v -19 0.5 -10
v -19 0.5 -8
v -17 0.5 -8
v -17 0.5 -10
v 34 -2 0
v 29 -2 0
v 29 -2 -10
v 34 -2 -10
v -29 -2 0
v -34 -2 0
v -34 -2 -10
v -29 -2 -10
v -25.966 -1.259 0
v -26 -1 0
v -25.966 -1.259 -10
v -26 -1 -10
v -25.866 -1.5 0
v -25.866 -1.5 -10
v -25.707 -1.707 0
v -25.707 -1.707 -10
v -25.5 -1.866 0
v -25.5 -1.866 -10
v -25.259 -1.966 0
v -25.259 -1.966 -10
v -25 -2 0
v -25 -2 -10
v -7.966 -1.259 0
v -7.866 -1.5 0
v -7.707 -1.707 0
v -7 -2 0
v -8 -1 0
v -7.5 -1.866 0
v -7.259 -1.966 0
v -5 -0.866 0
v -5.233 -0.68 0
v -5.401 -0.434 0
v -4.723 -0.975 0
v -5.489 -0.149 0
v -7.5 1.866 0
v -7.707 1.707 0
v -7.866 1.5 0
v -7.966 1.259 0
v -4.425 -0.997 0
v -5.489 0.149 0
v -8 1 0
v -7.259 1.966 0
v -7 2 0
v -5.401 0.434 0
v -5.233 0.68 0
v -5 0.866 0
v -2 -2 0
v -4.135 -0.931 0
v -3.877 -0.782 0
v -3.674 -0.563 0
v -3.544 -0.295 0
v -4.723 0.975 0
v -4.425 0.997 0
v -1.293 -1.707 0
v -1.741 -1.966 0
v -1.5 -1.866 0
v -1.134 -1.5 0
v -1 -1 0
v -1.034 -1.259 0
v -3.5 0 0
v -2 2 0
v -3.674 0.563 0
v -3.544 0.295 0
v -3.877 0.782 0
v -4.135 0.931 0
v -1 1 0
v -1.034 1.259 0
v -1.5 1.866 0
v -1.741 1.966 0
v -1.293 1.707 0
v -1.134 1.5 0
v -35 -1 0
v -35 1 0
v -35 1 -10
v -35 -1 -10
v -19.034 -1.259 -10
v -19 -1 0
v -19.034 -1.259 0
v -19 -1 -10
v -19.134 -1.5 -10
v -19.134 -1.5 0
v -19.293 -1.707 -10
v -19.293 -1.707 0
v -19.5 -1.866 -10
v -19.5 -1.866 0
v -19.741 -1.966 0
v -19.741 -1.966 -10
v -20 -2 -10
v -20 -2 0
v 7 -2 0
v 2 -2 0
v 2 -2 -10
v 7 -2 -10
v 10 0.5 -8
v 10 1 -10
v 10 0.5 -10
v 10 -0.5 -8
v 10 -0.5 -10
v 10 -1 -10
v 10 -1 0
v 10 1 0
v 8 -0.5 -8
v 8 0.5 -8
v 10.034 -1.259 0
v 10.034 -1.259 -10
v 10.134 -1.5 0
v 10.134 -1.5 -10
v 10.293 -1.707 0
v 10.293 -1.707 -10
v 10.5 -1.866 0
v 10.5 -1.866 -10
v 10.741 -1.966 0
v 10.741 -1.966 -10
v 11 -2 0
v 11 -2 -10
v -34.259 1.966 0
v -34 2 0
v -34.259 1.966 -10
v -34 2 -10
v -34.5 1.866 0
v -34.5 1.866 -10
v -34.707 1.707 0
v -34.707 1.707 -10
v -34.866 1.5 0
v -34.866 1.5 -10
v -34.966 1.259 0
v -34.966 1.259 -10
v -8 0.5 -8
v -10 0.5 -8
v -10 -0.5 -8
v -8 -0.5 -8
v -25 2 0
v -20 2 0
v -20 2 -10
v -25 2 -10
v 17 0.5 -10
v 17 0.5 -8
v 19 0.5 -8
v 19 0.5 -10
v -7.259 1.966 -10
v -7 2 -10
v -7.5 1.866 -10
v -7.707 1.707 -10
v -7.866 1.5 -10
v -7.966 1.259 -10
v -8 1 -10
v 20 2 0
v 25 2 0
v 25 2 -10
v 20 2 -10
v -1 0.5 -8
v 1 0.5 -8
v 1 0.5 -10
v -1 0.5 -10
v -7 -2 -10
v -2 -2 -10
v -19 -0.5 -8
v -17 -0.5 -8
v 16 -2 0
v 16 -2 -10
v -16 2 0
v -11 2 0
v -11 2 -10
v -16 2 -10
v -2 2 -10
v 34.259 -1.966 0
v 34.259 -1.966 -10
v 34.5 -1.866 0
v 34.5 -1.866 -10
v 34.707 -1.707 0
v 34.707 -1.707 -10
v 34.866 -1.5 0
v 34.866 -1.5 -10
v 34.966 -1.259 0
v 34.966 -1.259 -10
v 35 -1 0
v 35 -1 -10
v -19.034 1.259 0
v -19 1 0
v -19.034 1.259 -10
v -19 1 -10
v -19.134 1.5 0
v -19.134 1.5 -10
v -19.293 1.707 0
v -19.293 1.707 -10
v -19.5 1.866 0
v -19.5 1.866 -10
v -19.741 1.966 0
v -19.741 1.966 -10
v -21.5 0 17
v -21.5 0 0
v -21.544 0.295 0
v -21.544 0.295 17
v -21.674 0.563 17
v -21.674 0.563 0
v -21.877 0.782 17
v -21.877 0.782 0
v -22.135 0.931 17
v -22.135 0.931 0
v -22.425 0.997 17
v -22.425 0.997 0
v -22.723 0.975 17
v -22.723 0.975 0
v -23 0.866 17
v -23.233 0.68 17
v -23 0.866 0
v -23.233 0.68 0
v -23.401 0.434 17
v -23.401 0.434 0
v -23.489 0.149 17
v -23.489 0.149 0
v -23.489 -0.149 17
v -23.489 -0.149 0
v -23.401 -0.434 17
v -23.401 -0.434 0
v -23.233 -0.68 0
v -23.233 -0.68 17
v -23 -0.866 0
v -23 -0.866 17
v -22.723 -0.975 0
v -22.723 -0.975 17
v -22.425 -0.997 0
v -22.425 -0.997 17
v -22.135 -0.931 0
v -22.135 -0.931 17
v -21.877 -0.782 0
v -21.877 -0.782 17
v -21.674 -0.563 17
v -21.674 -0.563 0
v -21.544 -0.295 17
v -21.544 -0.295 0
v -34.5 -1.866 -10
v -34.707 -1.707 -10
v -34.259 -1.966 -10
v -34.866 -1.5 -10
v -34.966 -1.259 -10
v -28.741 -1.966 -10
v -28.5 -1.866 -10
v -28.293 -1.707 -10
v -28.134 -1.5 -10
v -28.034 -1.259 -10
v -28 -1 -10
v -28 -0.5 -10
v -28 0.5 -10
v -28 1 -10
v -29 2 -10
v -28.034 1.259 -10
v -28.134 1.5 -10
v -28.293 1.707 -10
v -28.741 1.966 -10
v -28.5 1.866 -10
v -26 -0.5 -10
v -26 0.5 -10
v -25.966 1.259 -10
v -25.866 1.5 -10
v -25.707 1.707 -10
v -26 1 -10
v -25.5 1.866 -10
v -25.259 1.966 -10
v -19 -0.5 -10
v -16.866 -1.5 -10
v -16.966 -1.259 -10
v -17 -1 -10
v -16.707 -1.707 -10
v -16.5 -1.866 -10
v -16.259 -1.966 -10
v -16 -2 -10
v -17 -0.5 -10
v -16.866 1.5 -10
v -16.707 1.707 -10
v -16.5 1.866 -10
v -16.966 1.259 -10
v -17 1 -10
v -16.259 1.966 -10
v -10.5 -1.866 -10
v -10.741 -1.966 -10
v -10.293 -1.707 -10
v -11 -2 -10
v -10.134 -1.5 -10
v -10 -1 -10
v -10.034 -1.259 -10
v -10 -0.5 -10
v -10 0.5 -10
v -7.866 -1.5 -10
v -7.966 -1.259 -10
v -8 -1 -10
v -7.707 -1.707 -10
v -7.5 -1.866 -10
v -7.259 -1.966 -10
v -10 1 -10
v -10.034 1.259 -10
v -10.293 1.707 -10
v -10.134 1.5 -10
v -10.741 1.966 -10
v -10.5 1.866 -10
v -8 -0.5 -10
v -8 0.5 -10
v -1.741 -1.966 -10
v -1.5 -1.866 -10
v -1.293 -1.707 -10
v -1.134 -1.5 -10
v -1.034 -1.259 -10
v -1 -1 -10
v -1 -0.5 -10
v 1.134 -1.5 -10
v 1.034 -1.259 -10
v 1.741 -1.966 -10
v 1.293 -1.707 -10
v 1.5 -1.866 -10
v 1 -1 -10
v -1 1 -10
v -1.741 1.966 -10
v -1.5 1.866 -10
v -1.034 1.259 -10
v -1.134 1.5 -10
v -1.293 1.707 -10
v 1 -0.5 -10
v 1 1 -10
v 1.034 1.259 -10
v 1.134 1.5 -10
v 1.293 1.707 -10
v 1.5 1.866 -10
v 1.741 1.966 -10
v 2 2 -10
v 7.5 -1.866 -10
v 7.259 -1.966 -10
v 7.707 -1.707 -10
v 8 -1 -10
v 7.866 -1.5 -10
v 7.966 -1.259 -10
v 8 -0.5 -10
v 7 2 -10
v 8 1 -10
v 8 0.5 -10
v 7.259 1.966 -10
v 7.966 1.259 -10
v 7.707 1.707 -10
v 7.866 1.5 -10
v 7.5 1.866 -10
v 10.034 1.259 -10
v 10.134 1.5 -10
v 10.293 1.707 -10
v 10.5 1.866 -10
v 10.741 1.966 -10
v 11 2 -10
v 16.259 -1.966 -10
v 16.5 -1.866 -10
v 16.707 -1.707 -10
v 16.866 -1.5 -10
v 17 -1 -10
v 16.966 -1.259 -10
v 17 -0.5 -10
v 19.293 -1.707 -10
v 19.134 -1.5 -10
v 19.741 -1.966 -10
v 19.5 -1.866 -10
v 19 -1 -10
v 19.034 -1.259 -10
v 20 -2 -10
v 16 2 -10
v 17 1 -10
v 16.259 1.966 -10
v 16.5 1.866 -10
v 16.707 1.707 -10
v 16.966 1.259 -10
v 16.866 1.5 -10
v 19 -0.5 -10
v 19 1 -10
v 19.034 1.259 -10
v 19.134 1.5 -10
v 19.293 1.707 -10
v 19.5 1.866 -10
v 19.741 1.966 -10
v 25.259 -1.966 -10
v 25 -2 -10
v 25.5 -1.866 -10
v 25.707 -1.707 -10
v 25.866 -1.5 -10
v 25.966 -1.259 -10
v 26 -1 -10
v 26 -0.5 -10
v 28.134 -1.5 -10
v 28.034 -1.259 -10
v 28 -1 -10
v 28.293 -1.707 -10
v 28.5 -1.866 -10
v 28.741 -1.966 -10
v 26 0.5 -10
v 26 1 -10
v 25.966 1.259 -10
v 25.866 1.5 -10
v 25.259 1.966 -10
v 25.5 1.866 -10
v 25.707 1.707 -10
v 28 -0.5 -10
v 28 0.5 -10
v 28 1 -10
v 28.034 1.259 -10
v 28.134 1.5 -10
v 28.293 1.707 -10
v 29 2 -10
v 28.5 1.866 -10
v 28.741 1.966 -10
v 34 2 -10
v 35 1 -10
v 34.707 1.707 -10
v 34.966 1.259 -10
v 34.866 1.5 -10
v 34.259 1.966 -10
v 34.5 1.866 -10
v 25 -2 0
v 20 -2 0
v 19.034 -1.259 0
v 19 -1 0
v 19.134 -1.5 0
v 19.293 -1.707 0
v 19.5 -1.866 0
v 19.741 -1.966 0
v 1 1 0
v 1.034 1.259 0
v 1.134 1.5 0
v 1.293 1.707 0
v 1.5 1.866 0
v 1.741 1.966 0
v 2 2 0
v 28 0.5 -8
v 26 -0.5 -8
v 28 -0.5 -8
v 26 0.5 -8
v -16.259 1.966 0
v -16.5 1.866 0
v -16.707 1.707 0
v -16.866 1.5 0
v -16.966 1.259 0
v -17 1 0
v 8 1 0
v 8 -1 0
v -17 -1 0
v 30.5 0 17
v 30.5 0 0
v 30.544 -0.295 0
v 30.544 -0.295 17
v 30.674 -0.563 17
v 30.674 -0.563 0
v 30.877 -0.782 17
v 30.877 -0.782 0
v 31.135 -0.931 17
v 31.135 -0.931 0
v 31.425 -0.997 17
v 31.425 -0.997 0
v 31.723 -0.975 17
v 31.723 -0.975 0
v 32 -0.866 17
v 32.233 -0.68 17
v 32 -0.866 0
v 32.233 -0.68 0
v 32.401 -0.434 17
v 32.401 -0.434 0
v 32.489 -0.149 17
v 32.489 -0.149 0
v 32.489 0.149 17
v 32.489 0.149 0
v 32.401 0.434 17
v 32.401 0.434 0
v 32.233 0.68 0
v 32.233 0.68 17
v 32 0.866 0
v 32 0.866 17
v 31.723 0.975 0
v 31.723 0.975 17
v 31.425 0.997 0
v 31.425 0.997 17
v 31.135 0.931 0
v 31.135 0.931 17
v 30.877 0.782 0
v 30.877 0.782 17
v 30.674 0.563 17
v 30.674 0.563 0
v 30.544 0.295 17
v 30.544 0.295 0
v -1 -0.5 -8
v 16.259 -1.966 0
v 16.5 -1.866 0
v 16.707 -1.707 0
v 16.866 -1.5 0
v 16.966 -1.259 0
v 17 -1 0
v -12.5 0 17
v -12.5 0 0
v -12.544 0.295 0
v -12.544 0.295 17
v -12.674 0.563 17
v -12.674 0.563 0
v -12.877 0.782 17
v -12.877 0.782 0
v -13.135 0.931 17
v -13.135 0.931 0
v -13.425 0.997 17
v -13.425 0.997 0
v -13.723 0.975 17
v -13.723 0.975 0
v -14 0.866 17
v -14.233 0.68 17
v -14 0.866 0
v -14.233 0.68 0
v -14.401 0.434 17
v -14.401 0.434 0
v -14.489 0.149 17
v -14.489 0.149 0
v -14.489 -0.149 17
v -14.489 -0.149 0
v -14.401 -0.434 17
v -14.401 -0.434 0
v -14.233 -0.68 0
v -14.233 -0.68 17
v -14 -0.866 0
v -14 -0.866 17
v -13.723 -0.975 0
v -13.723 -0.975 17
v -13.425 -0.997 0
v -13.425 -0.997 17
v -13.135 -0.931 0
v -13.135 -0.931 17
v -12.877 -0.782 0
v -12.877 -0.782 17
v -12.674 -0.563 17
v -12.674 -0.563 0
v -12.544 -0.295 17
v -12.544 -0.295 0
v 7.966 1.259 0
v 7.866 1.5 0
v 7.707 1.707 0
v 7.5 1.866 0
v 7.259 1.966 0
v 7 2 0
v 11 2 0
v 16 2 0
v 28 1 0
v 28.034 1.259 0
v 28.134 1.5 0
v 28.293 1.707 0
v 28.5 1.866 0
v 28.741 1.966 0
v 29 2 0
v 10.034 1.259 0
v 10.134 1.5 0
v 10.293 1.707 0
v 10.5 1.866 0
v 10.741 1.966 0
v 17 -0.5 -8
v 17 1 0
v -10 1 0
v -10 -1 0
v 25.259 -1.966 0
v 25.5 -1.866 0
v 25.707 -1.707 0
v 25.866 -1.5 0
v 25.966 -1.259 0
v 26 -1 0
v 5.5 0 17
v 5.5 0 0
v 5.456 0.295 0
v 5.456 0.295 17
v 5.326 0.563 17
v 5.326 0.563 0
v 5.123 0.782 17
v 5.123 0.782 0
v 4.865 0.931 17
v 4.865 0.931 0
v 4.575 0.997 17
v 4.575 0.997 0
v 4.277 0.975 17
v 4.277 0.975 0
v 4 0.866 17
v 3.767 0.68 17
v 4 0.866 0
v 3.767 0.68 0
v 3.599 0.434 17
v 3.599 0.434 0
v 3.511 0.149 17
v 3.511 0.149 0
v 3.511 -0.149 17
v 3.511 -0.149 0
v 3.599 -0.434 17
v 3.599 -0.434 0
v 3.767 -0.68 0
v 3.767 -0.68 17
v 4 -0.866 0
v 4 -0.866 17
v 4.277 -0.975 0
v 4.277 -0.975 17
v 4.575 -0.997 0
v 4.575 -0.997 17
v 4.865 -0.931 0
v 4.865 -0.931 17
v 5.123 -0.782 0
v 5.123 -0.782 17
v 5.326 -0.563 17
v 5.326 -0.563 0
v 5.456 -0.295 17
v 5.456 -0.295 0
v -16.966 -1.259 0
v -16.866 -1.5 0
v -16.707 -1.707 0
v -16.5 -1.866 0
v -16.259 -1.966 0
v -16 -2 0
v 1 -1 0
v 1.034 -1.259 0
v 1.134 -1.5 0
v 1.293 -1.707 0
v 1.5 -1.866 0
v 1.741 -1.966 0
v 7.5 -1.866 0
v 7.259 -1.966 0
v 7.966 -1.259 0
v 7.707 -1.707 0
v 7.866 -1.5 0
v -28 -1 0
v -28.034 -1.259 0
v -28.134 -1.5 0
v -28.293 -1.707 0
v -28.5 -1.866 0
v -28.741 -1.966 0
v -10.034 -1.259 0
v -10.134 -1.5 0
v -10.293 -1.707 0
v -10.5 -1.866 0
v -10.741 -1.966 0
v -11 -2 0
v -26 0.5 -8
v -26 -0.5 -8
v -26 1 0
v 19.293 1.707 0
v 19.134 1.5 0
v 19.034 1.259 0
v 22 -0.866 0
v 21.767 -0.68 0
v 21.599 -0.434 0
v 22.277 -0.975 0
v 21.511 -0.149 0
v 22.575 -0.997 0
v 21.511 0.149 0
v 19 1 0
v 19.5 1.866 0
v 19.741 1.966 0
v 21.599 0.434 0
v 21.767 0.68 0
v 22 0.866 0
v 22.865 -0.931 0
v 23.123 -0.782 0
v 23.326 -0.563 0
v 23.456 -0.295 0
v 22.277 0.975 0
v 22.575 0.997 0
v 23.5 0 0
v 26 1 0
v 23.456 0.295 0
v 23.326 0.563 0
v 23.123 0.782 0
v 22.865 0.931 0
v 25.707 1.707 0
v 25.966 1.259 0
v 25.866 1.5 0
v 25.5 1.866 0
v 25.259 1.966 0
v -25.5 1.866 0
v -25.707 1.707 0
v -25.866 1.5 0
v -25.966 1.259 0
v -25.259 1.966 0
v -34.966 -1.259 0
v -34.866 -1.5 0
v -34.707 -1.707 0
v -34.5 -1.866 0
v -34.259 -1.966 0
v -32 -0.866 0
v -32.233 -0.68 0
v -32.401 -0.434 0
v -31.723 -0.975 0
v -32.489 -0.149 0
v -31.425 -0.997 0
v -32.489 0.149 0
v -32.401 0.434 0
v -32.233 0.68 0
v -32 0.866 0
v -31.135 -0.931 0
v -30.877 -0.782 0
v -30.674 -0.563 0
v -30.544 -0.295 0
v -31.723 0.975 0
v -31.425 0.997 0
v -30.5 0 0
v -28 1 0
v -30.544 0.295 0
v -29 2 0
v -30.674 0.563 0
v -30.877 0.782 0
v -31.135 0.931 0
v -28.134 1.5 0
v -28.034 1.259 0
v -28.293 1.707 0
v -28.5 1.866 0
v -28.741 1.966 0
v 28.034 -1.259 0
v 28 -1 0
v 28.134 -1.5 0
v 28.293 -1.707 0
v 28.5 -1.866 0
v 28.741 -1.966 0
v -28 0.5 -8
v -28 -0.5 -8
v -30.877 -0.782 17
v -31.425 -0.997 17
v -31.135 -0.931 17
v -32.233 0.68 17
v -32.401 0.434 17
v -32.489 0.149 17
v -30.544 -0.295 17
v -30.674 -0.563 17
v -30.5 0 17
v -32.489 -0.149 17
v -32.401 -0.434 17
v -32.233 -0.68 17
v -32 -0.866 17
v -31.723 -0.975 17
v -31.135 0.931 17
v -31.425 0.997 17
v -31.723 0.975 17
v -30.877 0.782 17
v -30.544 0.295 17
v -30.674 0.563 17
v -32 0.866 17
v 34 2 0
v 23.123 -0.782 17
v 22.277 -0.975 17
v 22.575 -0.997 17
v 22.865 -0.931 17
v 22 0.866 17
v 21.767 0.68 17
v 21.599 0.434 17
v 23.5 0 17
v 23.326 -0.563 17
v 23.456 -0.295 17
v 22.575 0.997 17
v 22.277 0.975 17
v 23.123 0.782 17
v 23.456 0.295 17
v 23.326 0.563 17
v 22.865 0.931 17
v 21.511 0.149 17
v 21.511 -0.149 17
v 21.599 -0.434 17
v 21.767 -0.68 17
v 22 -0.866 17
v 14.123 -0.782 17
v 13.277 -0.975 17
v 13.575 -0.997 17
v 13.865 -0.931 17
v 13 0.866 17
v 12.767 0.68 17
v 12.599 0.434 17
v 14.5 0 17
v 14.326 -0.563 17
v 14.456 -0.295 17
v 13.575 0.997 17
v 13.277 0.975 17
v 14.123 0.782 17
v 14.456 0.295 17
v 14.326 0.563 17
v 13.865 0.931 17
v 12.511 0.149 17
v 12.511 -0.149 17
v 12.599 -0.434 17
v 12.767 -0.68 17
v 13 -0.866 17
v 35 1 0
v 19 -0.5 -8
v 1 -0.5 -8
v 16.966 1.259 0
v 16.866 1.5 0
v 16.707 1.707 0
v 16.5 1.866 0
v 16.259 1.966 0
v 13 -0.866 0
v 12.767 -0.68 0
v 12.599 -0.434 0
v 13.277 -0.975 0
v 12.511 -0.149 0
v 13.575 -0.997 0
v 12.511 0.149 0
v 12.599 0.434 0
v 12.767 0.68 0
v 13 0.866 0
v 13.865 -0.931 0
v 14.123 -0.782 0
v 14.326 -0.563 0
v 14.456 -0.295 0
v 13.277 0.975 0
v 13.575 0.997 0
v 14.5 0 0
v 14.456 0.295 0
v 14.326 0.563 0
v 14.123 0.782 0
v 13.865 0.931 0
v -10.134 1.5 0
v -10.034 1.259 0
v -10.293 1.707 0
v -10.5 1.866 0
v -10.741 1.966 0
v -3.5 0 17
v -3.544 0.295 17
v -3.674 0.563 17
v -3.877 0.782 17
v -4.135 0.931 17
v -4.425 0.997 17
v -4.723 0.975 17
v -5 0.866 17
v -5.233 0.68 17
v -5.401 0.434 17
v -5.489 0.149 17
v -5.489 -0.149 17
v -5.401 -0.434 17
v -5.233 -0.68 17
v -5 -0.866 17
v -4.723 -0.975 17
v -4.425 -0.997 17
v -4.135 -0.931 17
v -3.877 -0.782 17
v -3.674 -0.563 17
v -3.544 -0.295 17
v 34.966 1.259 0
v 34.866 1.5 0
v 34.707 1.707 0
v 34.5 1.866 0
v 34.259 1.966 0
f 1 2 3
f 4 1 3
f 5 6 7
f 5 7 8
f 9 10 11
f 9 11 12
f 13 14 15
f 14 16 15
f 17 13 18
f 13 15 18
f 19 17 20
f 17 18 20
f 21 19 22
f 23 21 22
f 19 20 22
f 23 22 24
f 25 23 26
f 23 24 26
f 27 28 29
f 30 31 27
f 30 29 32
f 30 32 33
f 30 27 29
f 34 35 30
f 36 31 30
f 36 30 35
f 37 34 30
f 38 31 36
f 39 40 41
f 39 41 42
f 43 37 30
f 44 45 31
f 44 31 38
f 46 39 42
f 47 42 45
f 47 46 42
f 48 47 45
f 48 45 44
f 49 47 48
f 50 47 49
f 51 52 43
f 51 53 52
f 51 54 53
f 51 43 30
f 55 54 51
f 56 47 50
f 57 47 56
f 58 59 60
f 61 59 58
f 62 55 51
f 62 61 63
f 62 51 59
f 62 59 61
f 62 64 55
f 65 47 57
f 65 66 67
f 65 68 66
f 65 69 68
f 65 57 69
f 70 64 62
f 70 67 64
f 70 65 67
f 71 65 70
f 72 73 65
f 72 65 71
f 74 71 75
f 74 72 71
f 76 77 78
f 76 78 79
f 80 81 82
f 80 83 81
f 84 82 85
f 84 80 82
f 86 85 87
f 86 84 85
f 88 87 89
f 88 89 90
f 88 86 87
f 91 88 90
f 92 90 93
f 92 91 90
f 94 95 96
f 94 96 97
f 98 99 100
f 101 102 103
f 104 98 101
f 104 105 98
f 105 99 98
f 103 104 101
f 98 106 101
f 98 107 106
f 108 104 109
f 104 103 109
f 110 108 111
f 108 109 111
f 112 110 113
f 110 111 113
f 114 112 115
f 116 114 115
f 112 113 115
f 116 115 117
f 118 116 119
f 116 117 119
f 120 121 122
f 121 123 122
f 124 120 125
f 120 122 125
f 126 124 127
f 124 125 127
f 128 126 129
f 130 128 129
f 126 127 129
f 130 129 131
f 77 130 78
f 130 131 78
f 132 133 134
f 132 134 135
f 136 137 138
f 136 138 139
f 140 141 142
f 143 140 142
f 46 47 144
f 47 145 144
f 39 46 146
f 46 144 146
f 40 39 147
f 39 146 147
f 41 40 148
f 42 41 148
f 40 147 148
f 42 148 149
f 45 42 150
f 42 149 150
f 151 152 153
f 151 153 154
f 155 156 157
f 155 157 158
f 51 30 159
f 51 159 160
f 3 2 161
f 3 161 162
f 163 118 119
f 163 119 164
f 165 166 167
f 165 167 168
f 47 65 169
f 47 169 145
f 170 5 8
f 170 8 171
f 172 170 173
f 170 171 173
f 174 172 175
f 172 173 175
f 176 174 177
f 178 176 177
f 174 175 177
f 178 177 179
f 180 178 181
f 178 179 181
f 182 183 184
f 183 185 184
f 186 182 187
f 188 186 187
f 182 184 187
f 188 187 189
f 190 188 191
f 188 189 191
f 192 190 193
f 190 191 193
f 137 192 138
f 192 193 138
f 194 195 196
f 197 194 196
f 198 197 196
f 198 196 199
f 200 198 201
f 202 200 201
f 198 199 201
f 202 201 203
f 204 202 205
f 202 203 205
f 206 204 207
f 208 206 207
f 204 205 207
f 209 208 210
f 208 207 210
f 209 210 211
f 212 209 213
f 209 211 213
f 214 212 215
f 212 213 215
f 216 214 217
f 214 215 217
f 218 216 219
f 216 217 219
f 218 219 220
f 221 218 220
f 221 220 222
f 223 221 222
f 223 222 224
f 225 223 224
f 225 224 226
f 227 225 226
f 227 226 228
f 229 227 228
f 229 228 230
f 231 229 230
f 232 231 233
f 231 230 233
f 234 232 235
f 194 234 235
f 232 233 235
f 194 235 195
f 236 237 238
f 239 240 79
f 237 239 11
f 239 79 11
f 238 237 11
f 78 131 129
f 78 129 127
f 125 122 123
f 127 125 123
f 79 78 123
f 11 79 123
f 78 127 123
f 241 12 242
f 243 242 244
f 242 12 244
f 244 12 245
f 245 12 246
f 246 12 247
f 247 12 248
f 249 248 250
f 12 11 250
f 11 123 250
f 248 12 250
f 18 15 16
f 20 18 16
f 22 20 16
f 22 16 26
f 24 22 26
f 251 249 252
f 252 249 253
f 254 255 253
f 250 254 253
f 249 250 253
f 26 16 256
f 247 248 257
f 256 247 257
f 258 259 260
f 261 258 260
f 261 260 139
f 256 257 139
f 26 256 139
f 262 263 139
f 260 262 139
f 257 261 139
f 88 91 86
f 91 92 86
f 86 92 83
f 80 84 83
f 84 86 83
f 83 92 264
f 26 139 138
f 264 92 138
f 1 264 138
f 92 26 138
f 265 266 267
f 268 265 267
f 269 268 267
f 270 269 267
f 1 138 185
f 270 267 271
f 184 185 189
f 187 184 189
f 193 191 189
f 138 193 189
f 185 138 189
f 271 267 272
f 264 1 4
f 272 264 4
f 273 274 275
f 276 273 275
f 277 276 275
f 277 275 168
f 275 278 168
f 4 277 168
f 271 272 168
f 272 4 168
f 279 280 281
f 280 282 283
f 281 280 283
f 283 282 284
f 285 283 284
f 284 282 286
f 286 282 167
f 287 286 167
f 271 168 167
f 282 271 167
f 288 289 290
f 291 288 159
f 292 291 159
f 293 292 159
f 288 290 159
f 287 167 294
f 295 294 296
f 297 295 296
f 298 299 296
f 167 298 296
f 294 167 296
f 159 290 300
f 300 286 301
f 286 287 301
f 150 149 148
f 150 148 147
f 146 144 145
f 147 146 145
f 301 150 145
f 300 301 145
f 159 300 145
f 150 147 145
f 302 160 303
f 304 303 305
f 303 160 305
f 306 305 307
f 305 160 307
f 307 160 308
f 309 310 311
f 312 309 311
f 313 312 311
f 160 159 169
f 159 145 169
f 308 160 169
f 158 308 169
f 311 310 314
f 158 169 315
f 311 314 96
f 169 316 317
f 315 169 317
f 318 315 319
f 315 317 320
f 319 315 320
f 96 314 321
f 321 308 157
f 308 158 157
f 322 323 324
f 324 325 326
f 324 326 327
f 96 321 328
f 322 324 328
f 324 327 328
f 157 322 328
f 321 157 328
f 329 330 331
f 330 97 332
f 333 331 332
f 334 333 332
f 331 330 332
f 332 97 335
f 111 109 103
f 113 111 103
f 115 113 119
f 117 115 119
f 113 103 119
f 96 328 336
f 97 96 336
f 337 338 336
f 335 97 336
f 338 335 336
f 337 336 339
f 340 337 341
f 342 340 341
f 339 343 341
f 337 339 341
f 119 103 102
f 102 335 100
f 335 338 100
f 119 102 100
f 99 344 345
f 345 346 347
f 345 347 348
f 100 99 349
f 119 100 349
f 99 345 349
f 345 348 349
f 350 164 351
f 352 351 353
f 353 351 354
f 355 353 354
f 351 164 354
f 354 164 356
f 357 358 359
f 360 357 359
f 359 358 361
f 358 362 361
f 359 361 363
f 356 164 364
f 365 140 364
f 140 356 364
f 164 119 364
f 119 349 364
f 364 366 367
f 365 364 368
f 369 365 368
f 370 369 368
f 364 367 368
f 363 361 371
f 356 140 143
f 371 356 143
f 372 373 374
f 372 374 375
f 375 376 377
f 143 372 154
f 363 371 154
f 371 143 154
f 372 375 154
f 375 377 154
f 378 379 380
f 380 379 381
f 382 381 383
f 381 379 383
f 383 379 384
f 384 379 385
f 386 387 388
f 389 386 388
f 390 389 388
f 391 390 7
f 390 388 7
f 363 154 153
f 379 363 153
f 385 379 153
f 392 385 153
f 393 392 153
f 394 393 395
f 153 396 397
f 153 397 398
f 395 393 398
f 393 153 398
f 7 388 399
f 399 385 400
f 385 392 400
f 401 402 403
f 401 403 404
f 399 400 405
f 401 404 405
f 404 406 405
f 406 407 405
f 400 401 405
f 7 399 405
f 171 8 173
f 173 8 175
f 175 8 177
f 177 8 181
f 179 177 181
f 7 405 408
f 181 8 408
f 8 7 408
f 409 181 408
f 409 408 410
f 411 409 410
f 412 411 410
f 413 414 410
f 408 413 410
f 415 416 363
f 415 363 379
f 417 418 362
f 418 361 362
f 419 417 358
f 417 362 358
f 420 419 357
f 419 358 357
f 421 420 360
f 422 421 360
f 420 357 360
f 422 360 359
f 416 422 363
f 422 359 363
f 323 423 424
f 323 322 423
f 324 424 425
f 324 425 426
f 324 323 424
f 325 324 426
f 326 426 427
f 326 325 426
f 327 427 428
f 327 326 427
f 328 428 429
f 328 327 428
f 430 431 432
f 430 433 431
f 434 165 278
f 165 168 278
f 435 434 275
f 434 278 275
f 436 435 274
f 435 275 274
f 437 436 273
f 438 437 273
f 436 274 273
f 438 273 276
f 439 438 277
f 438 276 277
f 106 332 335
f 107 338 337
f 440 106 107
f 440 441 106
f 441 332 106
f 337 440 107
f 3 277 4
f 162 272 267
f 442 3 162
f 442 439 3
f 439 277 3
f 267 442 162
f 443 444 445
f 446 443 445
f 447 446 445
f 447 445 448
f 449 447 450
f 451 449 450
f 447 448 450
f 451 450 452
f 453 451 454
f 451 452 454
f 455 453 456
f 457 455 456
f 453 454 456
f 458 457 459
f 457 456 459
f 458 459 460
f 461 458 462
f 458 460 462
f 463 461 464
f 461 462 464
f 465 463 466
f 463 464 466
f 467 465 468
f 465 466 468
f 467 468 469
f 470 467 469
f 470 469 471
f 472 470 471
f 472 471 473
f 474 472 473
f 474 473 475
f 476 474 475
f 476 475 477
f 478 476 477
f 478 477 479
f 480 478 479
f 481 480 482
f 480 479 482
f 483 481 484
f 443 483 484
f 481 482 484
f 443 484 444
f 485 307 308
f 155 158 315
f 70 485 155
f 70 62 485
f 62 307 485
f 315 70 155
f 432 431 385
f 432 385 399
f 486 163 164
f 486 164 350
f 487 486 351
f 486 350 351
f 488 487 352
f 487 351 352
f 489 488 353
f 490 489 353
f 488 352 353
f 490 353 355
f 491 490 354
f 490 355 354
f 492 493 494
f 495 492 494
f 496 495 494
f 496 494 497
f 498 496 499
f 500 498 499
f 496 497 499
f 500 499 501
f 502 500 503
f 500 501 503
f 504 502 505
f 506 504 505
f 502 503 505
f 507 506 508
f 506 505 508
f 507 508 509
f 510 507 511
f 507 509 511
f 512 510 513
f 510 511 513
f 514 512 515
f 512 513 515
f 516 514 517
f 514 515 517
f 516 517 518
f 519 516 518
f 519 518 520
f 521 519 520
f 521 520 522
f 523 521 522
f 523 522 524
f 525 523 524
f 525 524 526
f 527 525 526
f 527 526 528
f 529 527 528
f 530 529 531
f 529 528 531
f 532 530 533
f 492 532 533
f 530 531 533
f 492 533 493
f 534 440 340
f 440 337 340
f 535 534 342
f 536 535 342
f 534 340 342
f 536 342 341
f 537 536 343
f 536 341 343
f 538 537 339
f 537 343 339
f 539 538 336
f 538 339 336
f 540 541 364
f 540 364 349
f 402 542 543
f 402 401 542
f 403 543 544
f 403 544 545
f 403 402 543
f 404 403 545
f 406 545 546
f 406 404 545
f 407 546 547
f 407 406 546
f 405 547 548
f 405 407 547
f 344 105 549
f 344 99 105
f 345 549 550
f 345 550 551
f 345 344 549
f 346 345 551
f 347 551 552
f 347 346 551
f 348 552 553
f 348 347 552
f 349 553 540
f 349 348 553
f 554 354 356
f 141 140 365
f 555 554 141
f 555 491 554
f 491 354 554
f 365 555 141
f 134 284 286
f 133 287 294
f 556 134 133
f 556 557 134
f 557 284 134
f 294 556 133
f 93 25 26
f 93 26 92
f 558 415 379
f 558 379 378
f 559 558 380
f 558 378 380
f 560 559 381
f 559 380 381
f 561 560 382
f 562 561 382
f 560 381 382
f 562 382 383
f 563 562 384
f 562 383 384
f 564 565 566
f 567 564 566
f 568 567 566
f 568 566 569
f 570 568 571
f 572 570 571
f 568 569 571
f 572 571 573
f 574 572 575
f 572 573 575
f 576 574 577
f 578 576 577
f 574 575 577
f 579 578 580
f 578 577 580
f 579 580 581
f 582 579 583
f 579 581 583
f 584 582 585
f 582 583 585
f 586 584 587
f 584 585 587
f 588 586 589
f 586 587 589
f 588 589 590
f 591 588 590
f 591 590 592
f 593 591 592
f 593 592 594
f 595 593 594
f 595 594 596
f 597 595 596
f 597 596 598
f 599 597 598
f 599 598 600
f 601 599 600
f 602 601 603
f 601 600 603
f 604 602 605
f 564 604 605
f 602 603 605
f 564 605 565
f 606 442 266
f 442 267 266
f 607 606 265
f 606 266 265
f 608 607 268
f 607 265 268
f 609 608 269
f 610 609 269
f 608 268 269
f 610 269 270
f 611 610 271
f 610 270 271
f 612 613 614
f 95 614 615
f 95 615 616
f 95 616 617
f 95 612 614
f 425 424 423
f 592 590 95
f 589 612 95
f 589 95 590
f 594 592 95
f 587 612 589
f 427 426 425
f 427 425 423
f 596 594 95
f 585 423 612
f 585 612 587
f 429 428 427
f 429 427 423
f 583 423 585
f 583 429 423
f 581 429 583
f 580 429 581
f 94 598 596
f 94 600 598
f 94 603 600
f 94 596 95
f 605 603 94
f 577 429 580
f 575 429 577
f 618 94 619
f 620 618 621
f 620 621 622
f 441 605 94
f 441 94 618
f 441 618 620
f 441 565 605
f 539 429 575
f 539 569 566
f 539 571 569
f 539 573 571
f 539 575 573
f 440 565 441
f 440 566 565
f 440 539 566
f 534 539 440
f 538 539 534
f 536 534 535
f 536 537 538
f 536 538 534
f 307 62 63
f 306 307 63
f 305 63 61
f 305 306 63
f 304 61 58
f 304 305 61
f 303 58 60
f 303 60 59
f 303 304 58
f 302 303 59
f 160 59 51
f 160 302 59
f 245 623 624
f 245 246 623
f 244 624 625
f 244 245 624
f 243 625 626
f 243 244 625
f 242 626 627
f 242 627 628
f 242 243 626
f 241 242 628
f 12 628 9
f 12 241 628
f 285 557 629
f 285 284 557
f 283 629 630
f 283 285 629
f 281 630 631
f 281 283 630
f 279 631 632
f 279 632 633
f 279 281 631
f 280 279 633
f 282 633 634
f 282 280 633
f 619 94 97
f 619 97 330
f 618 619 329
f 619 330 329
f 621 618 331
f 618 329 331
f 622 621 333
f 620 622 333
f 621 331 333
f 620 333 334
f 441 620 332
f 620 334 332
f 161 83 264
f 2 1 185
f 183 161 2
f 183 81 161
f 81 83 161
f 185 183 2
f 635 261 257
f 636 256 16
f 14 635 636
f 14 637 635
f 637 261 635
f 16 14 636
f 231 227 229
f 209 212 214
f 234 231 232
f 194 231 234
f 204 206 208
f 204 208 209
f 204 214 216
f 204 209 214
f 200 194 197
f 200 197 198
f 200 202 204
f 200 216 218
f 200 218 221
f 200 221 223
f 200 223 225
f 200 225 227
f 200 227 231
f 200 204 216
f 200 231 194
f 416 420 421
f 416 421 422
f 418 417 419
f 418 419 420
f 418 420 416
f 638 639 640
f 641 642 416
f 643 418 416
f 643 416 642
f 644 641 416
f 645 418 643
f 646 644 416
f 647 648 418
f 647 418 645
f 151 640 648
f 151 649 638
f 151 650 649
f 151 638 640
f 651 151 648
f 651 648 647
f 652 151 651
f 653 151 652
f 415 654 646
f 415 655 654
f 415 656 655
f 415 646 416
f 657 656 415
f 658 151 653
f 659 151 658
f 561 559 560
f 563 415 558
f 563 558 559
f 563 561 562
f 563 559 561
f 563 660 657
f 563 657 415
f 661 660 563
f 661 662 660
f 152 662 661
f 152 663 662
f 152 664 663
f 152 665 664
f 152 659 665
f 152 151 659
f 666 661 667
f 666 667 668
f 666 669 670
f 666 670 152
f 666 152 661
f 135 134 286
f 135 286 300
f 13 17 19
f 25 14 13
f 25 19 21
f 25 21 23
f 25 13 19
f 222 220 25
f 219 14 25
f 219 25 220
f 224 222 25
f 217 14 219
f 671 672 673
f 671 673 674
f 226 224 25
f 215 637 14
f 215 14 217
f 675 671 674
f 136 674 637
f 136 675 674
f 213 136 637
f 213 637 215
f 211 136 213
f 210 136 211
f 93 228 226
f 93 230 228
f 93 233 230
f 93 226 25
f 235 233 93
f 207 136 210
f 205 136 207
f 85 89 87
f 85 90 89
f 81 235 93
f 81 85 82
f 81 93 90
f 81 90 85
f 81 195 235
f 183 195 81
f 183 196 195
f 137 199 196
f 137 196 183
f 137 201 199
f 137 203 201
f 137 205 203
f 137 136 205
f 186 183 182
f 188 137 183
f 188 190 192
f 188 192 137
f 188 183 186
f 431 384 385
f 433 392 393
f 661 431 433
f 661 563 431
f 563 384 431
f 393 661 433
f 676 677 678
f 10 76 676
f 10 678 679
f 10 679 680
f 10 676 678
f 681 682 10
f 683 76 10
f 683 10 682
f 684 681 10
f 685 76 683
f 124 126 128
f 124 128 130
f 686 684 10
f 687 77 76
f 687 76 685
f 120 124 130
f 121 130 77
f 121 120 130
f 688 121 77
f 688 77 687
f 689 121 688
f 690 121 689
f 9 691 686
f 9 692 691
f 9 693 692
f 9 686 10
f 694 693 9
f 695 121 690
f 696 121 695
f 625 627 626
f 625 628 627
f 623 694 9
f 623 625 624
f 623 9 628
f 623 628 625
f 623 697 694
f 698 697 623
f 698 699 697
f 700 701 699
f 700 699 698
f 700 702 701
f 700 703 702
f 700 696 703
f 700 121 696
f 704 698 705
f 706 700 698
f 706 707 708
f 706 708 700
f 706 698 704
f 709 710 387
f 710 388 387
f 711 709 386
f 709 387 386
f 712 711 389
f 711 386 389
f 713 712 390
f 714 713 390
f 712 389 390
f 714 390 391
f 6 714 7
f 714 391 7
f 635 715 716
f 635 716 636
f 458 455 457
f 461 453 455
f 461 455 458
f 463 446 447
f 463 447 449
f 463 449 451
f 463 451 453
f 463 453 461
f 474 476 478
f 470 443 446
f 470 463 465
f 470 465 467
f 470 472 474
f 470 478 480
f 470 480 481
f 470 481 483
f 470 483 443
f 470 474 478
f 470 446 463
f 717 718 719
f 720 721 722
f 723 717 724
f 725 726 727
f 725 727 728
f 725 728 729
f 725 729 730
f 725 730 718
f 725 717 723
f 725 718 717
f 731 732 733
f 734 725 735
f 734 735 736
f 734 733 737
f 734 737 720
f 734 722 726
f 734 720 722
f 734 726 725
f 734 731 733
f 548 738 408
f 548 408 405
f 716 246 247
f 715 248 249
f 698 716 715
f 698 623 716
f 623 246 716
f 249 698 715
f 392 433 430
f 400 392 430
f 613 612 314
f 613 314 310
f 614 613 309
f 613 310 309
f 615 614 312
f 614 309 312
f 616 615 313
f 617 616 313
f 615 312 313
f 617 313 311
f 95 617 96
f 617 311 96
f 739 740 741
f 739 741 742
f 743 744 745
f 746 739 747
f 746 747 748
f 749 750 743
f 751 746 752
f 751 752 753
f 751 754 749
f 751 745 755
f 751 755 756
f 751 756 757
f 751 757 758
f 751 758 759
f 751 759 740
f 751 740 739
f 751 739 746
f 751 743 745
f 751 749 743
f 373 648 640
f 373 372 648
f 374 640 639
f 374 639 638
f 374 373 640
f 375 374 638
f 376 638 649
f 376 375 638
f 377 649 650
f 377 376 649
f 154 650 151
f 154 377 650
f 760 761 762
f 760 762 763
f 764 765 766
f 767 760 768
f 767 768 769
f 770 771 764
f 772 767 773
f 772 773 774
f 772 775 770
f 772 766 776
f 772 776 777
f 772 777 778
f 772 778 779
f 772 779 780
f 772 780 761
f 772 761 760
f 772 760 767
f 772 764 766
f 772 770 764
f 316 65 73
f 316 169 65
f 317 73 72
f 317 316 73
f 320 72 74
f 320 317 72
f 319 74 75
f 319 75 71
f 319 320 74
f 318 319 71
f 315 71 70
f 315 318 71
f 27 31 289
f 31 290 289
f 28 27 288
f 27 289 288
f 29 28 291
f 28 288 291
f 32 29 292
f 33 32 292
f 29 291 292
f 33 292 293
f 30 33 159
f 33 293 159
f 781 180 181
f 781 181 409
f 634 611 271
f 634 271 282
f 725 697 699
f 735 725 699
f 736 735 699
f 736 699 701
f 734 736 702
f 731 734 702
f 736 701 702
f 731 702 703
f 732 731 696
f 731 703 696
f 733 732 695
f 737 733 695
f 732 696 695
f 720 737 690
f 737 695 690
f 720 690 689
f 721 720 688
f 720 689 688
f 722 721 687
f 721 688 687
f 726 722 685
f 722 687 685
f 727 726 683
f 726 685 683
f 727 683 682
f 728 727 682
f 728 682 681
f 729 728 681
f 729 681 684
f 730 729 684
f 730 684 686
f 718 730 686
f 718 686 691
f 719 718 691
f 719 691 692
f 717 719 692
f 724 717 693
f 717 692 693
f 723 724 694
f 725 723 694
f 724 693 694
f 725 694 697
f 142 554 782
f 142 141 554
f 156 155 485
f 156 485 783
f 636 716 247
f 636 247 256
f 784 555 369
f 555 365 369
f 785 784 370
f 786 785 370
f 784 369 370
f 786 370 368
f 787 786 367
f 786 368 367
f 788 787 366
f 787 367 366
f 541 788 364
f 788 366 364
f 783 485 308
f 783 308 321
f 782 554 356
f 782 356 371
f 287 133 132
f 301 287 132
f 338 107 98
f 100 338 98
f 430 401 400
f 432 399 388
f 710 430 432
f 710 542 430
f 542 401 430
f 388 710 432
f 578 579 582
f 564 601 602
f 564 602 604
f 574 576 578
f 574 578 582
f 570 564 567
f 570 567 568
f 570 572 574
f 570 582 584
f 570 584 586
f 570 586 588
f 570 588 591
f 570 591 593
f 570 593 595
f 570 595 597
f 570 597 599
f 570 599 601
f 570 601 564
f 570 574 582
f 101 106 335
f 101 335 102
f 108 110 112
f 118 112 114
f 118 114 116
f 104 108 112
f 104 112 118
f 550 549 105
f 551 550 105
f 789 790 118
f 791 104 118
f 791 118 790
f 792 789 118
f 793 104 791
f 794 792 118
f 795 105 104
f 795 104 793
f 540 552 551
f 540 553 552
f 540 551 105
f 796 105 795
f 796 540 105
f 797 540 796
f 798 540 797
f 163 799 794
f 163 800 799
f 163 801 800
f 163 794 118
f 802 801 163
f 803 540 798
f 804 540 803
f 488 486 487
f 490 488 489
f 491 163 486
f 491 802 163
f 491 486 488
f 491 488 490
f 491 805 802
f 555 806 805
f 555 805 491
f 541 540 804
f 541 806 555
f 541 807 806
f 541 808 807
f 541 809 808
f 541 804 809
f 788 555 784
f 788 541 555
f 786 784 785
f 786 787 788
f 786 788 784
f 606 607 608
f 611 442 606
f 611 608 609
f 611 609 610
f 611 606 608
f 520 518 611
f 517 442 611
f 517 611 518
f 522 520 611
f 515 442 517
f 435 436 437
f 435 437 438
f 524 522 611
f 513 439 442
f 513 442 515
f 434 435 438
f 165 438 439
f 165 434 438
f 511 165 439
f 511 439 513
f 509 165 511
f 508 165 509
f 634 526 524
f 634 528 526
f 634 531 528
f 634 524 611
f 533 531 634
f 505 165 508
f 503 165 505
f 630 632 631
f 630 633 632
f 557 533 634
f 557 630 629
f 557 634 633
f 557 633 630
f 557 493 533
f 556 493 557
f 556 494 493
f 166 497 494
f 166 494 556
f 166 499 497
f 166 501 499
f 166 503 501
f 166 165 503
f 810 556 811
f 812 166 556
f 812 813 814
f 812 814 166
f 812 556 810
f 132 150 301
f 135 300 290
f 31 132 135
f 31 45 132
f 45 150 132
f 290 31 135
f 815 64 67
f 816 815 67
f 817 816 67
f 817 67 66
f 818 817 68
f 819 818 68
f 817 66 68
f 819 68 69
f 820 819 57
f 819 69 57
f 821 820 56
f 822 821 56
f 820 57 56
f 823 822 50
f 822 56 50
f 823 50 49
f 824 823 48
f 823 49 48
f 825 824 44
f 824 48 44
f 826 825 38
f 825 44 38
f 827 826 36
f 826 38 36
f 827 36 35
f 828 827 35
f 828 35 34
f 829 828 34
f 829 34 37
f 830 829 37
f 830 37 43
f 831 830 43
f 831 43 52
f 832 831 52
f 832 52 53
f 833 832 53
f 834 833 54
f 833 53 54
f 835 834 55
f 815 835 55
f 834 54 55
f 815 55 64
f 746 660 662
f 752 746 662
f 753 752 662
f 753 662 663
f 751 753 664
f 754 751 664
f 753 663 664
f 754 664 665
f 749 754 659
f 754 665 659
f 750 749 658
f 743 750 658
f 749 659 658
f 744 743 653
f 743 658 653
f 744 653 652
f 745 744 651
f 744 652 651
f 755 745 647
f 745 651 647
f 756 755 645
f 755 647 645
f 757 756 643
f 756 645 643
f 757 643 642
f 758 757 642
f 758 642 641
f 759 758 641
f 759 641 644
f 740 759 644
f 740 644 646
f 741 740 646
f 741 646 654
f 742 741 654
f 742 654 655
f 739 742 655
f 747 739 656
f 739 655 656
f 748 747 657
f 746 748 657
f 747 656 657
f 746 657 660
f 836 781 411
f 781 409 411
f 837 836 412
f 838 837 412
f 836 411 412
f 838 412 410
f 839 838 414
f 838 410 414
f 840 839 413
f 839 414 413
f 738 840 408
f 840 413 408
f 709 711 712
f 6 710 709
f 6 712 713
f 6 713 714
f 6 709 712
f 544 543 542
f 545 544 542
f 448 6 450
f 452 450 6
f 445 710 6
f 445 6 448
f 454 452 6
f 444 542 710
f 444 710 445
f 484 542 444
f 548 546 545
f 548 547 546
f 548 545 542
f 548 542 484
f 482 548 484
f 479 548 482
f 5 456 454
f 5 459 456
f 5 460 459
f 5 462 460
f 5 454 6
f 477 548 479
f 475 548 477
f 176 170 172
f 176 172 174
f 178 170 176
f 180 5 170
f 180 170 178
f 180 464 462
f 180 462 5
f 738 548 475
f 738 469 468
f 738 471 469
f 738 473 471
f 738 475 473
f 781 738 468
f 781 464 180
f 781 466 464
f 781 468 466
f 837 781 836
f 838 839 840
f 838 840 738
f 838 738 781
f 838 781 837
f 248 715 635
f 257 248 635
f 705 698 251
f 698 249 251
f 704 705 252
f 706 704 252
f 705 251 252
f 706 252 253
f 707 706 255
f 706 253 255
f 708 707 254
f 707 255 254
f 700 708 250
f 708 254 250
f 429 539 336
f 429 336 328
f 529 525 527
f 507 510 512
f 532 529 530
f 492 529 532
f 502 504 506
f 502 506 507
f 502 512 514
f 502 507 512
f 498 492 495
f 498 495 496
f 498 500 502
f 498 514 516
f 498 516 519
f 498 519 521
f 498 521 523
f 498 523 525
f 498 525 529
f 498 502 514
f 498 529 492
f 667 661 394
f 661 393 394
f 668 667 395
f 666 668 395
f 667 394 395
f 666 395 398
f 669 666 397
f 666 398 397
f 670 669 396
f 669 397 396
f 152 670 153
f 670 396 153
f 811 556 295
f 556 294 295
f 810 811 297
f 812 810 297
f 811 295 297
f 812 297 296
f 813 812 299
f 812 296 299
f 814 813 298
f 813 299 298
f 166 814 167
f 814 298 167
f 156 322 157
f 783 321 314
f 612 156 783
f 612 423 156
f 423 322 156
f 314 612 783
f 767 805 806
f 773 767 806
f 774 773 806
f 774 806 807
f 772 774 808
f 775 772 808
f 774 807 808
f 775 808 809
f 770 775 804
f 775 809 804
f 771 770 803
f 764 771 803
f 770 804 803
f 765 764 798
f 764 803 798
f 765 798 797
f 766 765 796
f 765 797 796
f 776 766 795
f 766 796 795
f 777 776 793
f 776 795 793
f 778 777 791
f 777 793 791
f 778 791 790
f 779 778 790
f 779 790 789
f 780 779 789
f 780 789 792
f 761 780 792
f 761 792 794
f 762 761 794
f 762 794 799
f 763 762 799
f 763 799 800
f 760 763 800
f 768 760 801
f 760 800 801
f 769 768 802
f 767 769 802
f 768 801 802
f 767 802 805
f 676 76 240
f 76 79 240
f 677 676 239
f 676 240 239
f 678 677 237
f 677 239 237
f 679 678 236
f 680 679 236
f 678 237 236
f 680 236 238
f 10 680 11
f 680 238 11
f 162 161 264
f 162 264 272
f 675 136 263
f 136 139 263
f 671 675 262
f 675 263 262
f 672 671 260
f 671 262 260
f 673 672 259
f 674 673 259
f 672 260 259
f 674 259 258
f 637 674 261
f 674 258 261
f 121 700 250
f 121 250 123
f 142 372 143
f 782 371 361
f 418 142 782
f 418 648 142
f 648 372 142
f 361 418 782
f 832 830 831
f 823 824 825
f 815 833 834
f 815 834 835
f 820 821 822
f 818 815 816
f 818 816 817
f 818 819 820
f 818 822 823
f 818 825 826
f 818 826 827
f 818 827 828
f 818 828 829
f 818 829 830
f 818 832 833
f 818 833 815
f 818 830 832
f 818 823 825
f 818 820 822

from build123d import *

# Parameters (mm, degrees)
F1_DEPTH = 10
F0_R     = 1
F2_START = -8
F0_W     = 2
F0_H     = 0.5
F0_H_2   = 1
F2_DEPTH = 2
F3_DEPTH = 17
F4_R     = 1


with BuildPart() as f1:
    # F0 (on Top) → F1 (new body)
    with BuildSketch(Plane.XY):
        Polygon((35, -2), (35, 2), (28, 2), (28, 0.5), (28, 0), (28, -0.5), (28, -2), align=None)
        with BuildLine():
            ThreePointArc((32.5, 0), (31.5, -1), (30.5, 0))
            ThreePointArc((30.5, 0), (31.5, 1), (32.5, 0))
        make_face(mode=Mode.SUBTRACT)
        with BuildLine():
            ThreePointArc((32.5, 0), (31.5, 1), (30.5, 0))
            ThreePointArc((30.5, 0), (31.5, -1), (32.5, 0))
        make_face()
    extrude(amount=-F1_DEPTH)



with BuildPart() as f1b:
    # F0 (on Top) → F1, piece 2 (new body)
    with BuildSketch(Plane.XY):
        Polygon((-28, 0.5), (-28, 2), (-35, 2), (-35, -2), (-28, -2), (-28, -0.5), align=None)
        with Locations((-31.5, 0)):
            Circle(F0_R, mode=Mode.SUBTRACT)
        with Locations((-31.5, 0)):
            Circle(F0_R)
    extrude(amount=-F1_DEPTH)


with BuildPart() as f1c:
    # F0 (on Top) → F1, piece 3 (new body)
    with BuildSketch(Plane.XY):
        with BuildLine():
            Line((19, -2), (26, -2))
            Line((26, -2), (26, -0.5))
            Line((26, -0.5), (26, 0))
            Line((26, 0), (23.5, 0))
            ThreePointArc((23.5, 0), (22.5, -1), (21.5, 0))
            Line((21.5, 0), (19, 0))
            Line((19, 0), (19, -0.5))
            Line((19, -0.5), (19, -2))
        make_face()
        with BuildLine():
            Line((26, 0.5), (26, 2))
            Line((26, 2), (19, 2))
            Line((19, 2), (19, 0.5))
            Line((19, 0.5), (19, 0))
            Line((19, 0), (21.5, 0))
            ThreePointArc((21.5, 0), (22.5, 1), (23.5, 0))
            Line((23.5, 0), (26, 0))
            Line((26, 0), (26, 0.5))
        make_face()
        with BuildLine():
            Line((22.5, 0), (23.5, 0))
            ThreePointArc((23.5, 0), (22.5, 1), (21.5, 0))
            Line((21.5, 0), (22.5, 0))
        make_face()
        with BuildLine():
            ThreePointArc((21.5, 0), (22.5, -1), (23.5, 0))
            Line((23.5, 0), (22.5, 0))
            Line((22.5, 0), (21.5, 0))
        make_face()
    extrude(amount=-F1_DEPTH)


with BuildPart() as f1d:
    # F0 (on Top) → F1, piece 4 (new body)
    with BuildSketch(Plane.XY):
        with BuildLine():
            Line((10, -2), (17, -2))
            Line((17, -2), (17, -0.5))
            Line((17, -0.5), (17, 0))
            Line((17, 0), (14.5, 0))
            ThreePointArc((14.5, 0), (13.5, -1), (12.5, 0))
            Line((12.5, 0), (10, 0))
            Line((10, 0), (10, -0.5))
            Line((10, -0.5), (10, -2))
        make_face()
        with BuildLine():
            Line((17, 0.5), (17, 2))
            Line((17, 2), (10, 2))
            Line((10, 2), (10, 0.5))
            Line((10, 0.5), (10, 0))
            Line((10, 0), (12.5, 0))
            ThreePointArc((12.5, 0), (13.5, 1), (14.5, 0))
            Line((14.5, 0), (17, 0))
            Line((17, 0), (17, 0.5))
        make_face()
        with BuildLine():
            Line((13.5, 0), (14.5, 0))
            ThreePointArc((14.5, 0), (13.5, 1), (12.5, 0))
            Line((12.5, 0), (13.5, 0))
        make_face()
        with BuildLine():
            ThreePointArc((12.5, 0), (13.5, -1), (14.5, 0))
            Line((14.5, 0), (13.5, 0))
            Line((13.5, 0), (12.5, 0))
        make_face()
    extrude(amount=-F1_DEPTH)


with BuildPart() as f1e:
    # F0 (on Top) → F1, piece 5 (new body)
    with BuildSketch(Plane.XY):
        Polygon((-19, 0.5), (-19, 2), (-26, 2), (-26, 0.5), (-26, -0.5), (-26, -2), (-19, -2), (-19, -0.5), align=None)
        with Locations((-22.5, 0)):
            Circle(F0_R, mode=Mode.SUBTRACT)
        with Locations((-22.5, 0)):
            Circle(F0_R)
    extrude(amount=-F1_DEPTH)


with BuildPart() as f1f:
    # F0 (on Top) → F1, piece 6 (new body)
    with BuildSketch(Plane.XY):
        Polygon((-10, 0.5), (-10, 2), (-17, 2), (-17, 0.5), (-17, -0.5), (-17, -2), (-10, -2), (-10, -0.5), align=None)
        with Locations((-13.5, 0)):
            Circle(F0_R, mode=Mode.SUBTRACT)
        with Locations((-13.5, 0)):
            Circle(F0_R)
    extrude(amount=-F1_DEPTH)


with BuildPart() as f1g:
    # F0 (on Top) → F1, piece 7 (new body)
    with BuildSketch(Plane.XY):
        with BuildLine():
            Line((8, 0.5), (8, 2))
            Line((8, 2), (1, 2))
            Line((1, 2), (1, 0.5))
            Line((1, 0.5), (1, 0))
            Line((1, 0), (3.5, 0))
            ThreePointArc((3.5, 0), (4.5, 1), (5.5, 0))
            Line((5.5, 0), (8, 0))
            Line((8, 0), (8, 0.5))
        make_face()
        with BuildLine():
            Line((1, -2), (8, -2))
            Line((8, -2), (8, -0.5))
            Line((8, -0.5), (8, 0))
            Line((8, 0), (5.5, 0))
            ThreePointArc((5.5, 0), (4.5, -1), (3.5, 0))
            Line((3.5, 0), (1, 0))
            Line((1, 0), (1, -0.5))
            Line((1, -0.5), (1, -2))
        make_face()
        with BuildLine():
            Line((4.5, 0), (5.5, 0))
            ThreePointArc((5.5, 0), (4.5, 1), (3.5, 0))
            Line((3.5, 0), (4.5, 0))
        make_face()
        with BuildLine():
            ThreePointArc((3.5, 0), (4.5, -1), (5.5, 0))
            Line((5.5, 0), (4.5, 0))
            Line((4.5, 0), (3.5, 0))
        make_face()
    extrude(amount=-F1_DEPTH)


with BuildPart() as f1h:
    # F0 (on Top) → F1, piece 8 (new body)
    with BuildSketch(Plane.XY):
        Polygon((-1, 0.5), (-1, 2), (-8, 2), (-8, 0.5), (-8, -0.5), (-8, -2), (-1, -2), (-1, -0.5), align=None)
        with Locations((-4.5, 0)):
            Circle(F0_R, mode=Mode.SUBTRACT)
        with Locations((-4.5, 0)):
            Circle(F0_R)
    extrude(amount=-F1_DEPTH)


with BuildPart() as f1_1:
    add(f1.part)

    add(f1b.part)  # F2 merges F1b

    add(f1c.part)  # F2 merges F1c

    add(f1d.part)  # F2 merges F1d

    add(f1e.part)  # F2 merges F1e

    add(f1f.part)  # F2 merges F1f

    add(f1g.part)  # F2 merges F1g

    add(f1h.part)  # F2 merges F1h
    # F0 (on Top) → F2 (join)
    with BuildSketch(Plane.XY.offset(F2_START)):
        with Locations((9, -0.25)):
            Rectangle(F0_W, F0_H)
        with Locations((9, 0.25)):
            Rectangle(F0_W, F0_H)
        with Locations((18, -0.25)):
            Rectangle(F0_W, F0_H)
        with Locations((18, 0.25)):
            Rectangle(F0_W, F0_H)
        with Locations((27, -0.25)):
            Rectangle(F0_W, F0_H)
        with Locations((27, 0.25)):
            Rectangle(F0_W, F0_H)
        Polygon((1, 0), (1, 0.5), (-1, 0.5), (-1, -0.5), (1, -0.5), align=None)
        with Locations((-9, 0)):
            Rectangle(F0_W, F0_H_2)
        with Locations((-18, 0)):
            Rectangle(F0_W, F0_H_2)
        with Locations((-27, 0)):
            Rectangle(F0_W, F0_H_2)
    extrude(amount=-F2_DEPTH)

    # F0 (on Top) → F3 (join)
    with BuildSketch(Plane.XY):
        with BuildLine():
            ThreePointArc((3.5, 0), (4.5, -1), (5.5, 0))
            Line((5.5, 0), (4.5, 0))
            Line((4.5, 0), (3.5, 0))
        make_face()
        with BuildLine():
            ThreePointArc((12.5, 0), (13.5, -1), (14.5, 0))
            Line((14.5, 0), (13.5, 0))
            Line((13.5, 0), (12.5, 0))
        make_face()
        with BuildLine():
            ThreePointArc((21.5, 0), (22.5, -1), (23.5, 0))
            Line((23.5, 0), (22.5, 0))
            Line((22.5, 0), (21.5, 0))
        make_face()
        with BuildLine():
            ThreePointArc((32.5, 0), (31.5, 1), (30.5, 0))
            ThreePointArc((30.5, 0), (31.5, -1), (32.5, 0))
        make_face()
        with BuildLine():
            Line((22.5, 0), (23.5, 0))
            ThreePointArc((23.5, 0), (22.5, 1), (21.5, 0))
            Line((21.5, 0), (22.5, 0))
        make_face()
        with BuildLine():
            Line((13.5, 0), (14.5, 0))
            ThreePointArc((14.5, 0), (13.5, 1), (12.5, 0))
            Line((12.5, 0), (13.5, 0))
        make_face()
        with BuildLine():
            Line((4.5, 0), (5.5, 0))
            ThreePointArc((5.5, 0), (4.5, 1), (3.5, 0))
            Line((3.5, 0), (4.5, 0))
        make_face()
        with Locations((-4.5, 0)):
            Circle(F0_R)
        with Locations((-13.5, 0)):
            Circle(F0_R)
        with Locations((-22.5, 0)):
            Circle(F0_R)
        with Locations((-31.5, 0)):
            Circle(F0_R)
    extrude(amount=F3_DEPTH)

    # F4
    f4_edges = [f1_1.edges().sort_by_distance(p)[0] for p in [
        (35, 2, -5),
        (28, 2, -5),
        (35, -2, -5),
        (26, 2, -5),
        (19, 2, -5),
        (17, 2, -5),
        (10, 2, -5),
        (8, 2, -5),
        (1, 2, -5),
        (-1, 2, -5),
        (-8, 2, -5),
        (-10, 2, -5),
        (-17, 2, -5),
        (-19, 2, -5),
        (-26, 2, -5),
        (-28, 2, -5),
        (-35, 2, -5),
        (28, -2, -5),
        (26, -2, -5),
        (19, -2, -5),
        (17, -2, -5),
        (10, -2, -5),
        (8, -2, -5),
        (1, -2, -5),
        (-1, -2, -5),
        (-8, -2, -5),
        (-10, -2, -5),
        (-17, -2, -5),
        (-19, -2, -5),
        (-26, -2, -5),
        (-28, -2, -5),
        (-35, -2, -5),
    ]]
    fillet(f4_edges, radius=F4_R)


solid = f1_1.part
